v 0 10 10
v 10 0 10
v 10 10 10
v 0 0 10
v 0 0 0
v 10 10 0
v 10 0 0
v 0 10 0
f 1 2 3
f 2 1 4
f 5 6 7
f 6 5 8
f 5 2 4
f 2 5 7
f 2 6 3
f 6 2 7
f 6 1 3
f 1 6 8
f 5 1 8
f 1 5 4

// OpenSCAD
include <maths.scad>

MatrixMaths();
DemoTransforms();
RealTrans();

module MatrixMaths()
{
	// Here's a vector being multiplied by a scalar
	T = vec4_mults([1/8, 1/4, 1/2, 1], 1/2);
	
	// Here's a nice 4x4 matrix, in row order
	N = [
		[-1, 7, 0, 1], 
		[1, -11, 0, 1], 
		[4, 0, 0, 1], 
		[4, 6, 0, 1]
		];
	
	// Here's another nice 4x4 in row order
	G = [
		[1, 0, 0, 0], 
		[0, 1/2, sqrt(3)/2, 0], 
		[0,0,0,0], 
		[0,0,0,1]
		];
	
	
	//
	echo("T: ", T);
	echo("N: ", N);
	
	// The result of multiplying the vector by the matrix
	// The end result being a 1x4 matrix (1 row, 4 columns)
	echo("T*N: ", vec4_mult_mat4(T, N));
	
	// A function that shows compound matrix operations
	function qcalc() = vec4_mult_mat4(vec4_mult_mat4(T, N), G);
	
	echo(qcalc());
}

module DemoTransforms()
{
	// Just some simple transforms on a point
	P = [3, 2, 1, 1];
	T2 = [-1, -1, -1];
	TM = transform_translate(T2);
	RX  = transform_rotx(30);
	RY = transform_roty(45);
	
	echo("P: ", P);
	echo("TM: ", TM);
	echo("RX: ", RX);
	echo("RY: ", RY);
	
	// Combine the two rotations
	RXY = mat4_mult_mat4(RX, RY);
	echo("RXY: ", RXY);
	
	// Combine the two rotations and the translation
	TRXY = mat4_mult_mat4(TM, RXY);
	echo("TRXY: ", TRXY);
	
	// Apply the combined rotations and translation to transform the point
	TPT = vec4_mult_mat4(P, TRXY);
	echo("TPT: ", TPT);
}

// Do a simple translation and apply it to the 
// OpenScad world
module RealTrans()
{
	T3 = transform_translate([5, 15, 7]);

	// Apply one of the transforms to the OpenScad 
	// world.  
	// You must do the transpose because apparently 
	// the OpenScad matrix is in column order, rather 
	// than row order I'm using
	multmatrix(m=mat4_transpose(T3))
	cube(size=[10,10,10]);
}
